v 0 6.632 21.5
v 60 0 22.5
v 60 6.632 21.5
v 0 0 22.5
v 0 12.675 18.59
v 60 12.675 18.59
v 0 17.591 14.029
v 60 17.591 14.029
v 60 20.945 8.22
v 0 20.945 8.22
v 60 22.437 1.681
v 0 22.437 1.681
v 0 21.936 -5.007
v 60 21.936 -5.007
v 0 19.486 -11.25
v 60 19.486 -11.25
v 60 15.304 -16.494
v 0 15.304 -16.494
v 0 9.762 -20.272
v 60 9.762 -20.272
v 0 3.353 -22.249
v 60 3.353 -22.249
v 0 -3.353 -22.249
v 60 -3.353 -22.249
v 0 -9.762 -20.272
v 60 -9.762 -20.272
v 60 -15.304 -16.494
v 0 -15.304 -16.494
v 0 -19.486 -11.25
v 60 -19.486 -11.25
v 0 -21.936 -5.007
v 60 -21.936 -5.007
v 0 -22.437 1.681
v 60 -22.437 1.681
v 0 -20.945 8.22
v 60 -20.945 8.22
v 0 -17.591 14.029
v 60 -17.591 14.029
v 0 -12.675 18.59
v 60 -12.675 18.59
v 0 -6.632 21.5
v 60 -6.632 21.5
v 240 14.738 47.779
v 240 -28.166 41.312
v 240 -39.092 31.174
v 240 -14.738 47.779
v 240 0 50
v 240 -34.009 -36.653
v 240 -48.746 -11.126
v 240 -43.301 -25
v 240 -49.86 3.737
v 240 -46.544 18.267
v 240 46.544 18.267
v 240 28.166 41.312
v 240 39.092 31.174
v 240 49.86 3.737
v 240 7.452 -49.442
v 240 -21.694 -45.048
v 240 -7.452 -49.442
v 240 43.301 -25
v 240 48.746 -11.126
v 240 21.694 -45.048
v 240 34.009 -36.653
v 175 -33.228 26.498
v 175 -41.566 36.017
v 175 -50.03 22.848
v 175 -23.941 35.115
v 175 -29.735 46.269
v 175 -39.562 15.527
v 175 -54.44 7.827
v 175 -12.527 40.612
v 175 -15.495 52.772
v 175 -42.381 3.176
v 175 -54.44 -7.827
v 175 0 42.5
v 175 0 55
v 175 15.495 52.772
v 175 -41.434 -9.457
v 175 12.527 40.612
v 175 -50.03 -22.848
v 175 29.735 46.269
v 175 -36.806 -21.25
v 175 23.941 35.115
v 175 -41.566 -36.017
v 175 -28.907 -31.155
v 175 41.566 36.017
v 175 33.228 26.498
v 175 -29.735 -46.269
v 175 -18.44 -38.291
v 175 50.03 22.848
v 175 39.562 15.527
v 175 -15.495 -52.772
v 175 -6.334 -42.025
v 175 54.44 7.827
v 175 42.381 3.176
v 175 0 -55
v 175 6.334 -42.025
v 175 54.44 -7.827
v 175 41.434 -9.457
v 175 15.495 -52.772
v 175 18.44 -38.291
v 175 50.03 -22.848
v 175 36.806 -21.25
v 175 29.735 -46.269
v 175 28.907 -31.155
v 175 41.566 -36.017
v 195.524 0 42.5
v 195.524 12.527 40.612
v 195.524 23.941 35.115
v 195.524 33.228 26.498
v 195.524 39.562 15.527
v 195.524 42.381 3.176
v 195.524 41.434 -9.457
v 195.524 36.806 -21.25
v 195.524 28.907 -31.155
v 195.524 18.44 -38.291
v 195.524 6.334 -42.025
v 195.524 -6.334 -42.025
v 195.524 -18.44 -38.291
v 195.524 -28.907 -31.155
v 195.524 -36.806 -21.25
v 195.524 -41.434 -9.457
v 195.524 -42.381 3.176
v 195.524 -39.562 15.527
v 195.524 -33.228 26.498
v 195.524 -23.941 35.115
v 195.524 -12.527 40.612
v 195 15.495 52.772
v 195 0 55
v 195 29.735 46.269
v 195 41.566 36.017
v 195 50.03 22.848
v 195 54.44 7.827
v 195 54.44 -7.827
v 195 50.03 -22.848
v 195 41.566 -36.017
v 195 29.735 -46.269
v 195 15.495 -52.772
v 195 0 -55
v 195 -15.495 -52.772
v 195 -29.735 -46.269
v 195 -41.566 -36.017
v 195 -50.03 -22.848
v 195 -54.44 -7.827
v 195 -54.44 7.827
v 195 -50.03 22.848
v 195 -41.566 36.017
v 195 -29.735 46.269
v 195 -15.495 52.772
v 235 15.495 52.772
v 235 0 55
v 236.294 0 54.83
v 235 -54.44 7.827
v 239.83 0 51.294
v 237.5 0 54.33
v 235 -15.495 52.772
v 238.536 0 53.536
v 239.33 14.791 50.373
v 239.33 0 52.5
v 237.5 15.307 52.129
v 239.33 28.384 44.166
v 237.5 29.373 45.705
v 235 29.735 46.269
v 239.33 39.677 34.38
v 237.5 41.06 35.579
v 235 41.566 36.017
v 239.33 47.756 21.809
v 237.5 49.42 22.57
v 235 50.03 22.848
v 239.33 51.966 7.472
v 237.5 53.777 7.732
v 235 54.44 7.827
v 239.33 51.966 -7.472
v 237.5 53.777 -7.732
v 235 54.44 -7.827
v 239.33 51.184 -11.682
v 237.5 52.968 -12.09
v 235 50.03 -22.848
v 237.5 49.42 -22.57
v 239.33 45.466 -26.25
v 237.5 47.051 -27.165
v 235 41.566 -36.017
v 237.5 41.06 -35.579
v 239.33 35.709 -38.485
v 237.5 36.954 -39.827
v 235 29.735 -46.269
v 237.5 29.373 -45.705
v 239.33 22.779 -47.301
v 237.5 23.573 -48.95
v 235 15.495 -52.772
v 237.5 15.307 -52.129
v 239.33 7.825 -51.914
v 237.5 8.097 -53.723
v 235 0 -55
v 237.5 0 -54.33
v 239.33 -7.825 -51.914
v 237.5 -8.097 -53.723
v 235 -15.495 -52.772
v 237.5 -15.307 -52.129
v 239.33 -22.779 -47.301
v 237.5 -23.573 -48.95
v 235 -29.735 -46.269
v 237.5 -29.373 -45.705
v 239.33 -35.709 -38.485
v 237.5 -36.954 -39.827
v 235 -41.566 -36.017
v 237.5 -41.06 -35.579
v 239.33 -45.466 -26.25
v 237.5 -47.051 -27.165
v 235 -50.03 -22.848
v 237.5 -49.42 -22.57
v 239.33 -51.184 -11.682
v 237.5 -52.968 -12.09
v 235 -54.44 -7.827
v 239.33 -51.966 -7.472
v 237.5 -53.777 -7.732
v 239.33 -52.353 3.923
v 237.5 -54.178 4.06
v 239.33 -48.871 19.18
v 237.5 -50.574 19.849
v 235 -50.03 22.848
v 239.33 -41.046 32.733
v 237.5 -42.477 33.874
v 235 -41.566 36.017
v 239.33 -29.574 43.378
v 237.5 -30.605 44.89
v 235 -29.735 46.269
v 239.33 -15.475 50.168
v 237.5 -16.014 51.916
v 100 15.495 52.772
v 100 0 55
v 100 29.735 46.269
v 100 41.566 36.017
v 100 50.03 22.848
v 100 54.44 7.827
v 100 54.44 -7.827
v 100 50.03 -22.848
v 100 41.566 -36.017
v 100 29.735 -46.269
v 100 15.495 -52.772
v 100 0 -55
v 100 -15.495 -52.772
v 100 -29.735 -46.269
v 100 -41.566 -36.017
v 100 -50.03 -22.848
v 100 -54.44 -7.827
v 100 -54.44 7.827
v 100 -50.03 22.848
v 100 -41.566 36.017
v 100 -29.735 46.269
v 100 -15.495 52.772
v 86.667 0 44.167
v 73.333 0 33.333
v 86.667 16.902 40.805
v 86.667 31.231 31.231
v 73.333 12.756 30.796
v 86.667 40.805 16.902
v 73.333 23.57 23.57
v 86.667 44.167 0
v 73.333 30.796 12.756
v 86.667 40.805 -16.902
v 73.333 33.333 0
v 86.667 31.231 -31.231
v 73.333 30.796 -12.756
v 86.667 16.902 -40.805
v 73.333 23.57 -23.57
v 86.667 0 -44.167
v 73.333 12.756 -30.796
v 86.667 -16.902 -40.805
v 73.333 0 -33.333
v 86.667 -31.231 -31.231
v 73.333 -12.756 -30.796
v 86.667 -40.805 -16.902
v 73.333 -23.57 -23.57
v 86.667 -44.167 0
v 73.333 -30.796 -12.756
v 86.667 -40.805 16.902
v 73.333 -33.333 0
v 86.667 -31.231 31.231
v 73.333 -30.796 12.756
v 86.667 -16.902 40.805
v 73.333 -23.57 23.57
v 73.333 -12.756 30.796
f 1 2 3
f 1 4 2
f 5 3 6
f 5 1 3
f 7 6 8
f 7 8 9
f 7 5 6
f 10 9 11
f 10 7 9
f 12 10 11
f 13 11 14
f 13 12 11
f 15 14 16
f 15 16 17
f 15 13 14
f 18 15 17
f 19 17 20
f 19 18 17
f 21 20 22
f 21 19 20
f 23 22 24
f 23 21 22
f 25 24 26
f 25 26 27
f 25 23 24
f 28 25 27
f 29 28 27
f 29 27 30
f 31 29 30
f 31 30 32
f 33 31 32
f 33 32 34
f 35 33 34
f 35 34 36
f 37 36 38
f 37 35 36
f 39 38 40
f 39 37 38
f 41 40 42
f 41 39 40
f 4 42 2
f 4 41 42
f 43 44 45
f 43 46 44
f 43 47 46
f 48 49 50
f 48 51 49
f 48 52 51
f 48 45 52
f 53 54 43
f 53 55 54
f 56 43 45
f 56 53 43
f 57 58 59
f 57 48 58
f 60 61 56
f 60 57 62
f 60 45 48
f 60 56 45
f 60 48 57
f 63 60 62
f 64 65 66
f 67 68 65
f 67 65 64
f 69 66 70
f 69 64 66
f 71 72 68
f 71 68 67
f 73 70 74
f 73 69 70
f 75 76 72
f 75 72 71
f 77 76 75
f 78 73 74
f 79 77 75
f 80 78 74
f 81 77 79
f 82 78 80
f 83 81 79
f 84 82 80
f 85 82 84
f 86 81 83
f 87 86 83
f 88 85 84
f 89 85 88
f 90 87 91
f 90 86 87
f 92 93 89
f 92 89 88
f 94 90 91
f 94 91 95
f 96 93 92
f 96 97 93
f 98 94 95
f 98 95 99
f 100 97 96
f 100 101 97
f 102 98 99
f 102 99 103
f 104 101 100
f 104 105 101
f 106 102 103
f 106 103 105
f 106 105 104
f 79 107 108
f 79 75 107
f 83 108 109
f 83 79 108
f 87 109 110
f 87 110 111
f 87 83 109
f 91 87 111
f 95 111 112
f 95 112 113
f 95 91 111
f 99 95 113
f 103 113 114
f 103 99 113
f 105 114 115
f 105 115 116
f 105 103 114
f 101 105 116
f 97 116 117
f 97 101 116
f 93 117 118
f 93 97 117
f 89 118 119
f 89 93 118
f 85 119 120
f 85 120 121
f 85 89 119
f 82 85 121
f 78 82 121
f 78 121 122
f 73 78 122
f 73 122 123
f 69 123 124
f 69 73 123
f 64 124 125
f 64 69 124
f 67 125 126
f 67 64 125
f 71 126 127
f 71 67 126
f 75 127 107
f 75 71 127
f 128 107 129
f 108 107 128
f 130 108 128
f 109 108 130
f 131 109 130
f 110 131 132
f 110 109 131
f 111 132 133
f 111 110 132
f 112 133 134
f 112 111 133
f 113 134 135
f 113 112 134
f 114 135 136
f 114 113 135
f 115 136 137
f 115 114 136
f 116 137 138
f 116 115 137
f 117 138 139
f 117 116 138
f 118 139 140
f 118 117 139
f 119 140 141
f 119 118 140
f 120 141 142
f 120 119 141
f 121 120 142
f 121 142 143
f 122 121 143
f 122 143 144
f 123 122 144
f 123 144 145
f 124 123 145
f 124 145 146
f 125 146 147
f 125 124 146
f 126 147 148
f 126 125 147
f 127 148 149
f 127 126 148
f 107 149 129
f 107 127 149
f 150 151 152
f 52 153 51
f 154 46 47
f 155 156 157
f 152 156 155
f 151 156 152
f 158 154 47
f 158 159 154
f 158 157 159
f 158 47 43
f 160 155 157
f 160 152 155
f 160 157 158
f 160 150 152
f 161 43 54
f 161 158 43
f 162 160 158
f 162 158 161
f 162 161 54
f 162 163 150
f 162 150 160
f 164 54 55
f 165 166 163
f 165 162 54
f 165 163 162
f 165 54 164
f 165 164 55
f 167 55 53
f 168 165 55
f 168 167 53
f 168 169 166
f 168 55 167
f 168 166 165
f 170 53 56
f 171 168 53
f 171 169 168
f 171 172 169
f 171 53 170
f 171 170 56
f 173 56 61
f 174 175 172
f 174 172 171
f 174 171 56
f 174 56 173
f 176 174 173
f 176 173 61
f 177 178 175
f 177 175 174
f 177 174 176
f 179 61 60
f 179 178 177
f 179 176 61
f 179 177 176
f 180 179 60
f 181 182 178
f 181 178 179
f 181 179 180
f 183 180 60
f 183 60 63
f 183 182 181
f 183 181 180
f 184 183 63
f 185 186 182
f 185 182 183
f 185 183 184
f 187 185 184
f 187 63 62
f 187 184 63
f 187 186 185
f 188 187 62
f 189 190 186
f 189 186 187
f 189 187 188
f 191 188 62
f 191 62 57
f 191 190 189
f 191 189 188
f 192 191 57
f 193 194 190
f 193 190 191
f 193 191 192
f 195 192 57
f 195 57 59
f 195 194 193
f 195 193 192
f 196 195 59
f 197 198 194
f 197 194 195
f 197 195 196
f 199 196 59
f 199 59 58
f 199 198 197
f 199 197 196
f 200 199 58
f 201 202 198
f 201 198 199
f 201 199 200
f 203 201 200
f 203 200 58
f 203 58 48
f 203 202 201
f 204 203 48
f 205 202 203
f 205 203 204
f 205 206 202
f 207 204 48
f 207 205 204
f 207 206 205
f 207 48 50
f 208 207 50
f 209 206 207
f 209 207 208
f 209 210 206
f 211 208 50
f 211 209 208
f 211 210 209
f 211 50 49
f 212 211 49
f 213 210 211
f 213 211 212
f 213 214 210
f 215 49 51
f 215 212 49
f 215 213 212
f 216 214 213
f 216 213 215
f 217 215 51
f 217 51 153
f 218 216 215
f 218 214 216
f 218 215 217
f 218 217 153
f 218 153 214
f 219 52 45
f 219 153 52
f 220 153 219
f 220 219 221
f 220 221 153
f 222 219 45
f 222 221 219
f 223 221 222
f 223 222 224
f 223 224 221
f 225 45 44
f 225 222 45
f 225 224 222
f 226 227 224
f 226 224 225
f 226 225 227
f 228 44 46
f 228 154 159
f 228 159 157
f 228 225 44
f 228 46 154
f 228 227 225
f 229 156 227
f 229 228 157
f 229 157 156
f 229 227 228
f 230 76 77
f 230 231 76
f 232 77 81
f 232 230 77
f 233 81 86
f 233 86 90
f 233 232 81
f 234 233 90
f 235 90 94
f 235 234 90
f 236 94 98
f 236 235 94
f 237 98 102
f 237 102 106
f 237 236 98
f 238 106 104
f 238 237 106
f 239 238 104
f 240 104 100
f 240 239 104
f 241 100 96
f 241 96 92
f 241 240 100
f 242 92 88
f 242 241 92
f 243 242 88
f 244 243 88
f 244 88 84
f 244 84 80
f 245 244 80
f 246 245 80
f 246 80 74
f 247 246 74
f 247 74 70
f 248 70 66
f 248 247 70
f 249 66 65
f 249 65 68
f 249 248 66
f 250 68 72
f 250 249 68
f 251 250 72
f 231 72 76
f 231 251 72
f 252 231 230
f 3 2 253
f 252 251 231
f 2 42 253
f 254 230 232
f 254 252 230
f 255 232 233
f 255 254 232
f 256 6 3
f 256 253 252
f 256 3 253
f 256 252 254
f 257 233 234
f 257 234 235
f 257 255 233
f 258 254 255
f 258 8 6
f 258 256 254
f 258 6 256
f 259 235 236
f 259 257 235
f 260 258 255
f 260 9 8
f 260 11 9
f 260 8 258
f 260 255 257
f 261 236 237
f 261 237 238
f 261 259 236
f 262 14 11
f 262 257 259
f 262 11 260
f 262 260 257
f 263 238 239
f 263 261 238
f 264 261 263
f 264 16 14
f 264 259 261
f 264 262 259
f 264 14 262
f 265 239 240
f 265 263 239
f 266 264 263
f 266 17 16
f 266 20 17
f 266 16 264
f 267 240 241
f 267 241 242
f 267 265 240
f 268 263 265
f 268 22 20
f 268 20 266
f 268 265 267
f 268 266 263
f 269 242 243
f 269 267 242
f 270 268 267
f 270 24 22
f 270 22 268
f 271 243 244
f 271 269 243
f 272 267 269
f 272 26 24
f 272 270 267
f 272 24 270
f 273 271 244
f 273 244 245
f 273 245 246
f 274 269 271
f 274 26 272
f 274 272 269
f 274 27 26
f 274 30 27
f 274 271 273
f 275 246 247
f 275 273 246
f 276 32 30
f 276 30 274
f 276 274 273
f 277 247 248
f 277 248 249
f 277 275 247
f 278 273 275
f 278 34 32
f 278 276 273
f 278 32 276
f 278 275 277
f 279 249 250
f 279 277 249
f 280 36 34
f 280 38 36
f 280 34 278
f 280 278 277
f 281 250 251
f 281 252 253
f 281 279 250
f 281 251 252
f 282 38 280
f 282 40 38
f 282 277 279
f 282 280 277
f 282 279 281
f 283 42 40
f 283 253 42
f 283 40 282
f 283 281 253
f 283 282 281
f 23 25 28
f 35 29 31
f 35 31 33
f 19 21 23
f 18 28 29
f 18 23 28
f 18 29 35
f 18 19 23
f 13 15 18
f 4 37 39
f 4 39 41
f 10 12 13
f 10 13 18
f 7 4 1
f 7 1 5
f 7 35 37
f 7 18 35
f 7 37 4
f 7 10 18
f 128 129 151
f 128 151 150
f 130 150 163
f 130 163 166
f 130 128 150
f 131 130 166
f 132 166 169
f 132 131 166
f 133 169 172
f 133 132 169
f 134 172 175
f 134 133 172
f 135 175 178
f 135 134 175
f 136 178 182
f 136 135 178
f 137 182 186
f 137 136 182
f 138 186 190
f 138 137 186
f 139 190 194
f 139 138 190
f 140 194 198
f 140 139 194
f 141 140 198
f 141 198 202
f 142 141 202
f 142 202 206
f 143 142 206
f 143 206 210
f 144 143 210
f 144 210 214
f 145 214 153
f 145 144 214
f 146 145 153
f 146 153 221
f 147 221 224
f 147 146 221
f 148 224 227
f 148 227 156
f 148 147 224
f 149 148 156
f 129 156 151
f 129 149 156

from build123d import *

# Parameters (mm, degrees)
F2_R = 5


with BuildPart() as f1:
    # F0 (on Front) → F1 (revolve)
    with BuildSketch(Plane.XZ):
        Polygon((0, 22.5), (0, 0), (240, 0), (240, 55), (195, 55), (195.524231, 42.5), (175, 42.5), (175, 55), (100, 55), (60, 22.5), align=None)
    revolve(axis=Axis((-48.28571, 0, 0), (-1, 0, 0)))

    # F2
    f2_edges = [f1.edges().sort_by_distance(p)[0] for p in [
        (240, 0, -55),
    ]]
    fillet(f2_edges, radius=F2_R)


solid = f1.part
